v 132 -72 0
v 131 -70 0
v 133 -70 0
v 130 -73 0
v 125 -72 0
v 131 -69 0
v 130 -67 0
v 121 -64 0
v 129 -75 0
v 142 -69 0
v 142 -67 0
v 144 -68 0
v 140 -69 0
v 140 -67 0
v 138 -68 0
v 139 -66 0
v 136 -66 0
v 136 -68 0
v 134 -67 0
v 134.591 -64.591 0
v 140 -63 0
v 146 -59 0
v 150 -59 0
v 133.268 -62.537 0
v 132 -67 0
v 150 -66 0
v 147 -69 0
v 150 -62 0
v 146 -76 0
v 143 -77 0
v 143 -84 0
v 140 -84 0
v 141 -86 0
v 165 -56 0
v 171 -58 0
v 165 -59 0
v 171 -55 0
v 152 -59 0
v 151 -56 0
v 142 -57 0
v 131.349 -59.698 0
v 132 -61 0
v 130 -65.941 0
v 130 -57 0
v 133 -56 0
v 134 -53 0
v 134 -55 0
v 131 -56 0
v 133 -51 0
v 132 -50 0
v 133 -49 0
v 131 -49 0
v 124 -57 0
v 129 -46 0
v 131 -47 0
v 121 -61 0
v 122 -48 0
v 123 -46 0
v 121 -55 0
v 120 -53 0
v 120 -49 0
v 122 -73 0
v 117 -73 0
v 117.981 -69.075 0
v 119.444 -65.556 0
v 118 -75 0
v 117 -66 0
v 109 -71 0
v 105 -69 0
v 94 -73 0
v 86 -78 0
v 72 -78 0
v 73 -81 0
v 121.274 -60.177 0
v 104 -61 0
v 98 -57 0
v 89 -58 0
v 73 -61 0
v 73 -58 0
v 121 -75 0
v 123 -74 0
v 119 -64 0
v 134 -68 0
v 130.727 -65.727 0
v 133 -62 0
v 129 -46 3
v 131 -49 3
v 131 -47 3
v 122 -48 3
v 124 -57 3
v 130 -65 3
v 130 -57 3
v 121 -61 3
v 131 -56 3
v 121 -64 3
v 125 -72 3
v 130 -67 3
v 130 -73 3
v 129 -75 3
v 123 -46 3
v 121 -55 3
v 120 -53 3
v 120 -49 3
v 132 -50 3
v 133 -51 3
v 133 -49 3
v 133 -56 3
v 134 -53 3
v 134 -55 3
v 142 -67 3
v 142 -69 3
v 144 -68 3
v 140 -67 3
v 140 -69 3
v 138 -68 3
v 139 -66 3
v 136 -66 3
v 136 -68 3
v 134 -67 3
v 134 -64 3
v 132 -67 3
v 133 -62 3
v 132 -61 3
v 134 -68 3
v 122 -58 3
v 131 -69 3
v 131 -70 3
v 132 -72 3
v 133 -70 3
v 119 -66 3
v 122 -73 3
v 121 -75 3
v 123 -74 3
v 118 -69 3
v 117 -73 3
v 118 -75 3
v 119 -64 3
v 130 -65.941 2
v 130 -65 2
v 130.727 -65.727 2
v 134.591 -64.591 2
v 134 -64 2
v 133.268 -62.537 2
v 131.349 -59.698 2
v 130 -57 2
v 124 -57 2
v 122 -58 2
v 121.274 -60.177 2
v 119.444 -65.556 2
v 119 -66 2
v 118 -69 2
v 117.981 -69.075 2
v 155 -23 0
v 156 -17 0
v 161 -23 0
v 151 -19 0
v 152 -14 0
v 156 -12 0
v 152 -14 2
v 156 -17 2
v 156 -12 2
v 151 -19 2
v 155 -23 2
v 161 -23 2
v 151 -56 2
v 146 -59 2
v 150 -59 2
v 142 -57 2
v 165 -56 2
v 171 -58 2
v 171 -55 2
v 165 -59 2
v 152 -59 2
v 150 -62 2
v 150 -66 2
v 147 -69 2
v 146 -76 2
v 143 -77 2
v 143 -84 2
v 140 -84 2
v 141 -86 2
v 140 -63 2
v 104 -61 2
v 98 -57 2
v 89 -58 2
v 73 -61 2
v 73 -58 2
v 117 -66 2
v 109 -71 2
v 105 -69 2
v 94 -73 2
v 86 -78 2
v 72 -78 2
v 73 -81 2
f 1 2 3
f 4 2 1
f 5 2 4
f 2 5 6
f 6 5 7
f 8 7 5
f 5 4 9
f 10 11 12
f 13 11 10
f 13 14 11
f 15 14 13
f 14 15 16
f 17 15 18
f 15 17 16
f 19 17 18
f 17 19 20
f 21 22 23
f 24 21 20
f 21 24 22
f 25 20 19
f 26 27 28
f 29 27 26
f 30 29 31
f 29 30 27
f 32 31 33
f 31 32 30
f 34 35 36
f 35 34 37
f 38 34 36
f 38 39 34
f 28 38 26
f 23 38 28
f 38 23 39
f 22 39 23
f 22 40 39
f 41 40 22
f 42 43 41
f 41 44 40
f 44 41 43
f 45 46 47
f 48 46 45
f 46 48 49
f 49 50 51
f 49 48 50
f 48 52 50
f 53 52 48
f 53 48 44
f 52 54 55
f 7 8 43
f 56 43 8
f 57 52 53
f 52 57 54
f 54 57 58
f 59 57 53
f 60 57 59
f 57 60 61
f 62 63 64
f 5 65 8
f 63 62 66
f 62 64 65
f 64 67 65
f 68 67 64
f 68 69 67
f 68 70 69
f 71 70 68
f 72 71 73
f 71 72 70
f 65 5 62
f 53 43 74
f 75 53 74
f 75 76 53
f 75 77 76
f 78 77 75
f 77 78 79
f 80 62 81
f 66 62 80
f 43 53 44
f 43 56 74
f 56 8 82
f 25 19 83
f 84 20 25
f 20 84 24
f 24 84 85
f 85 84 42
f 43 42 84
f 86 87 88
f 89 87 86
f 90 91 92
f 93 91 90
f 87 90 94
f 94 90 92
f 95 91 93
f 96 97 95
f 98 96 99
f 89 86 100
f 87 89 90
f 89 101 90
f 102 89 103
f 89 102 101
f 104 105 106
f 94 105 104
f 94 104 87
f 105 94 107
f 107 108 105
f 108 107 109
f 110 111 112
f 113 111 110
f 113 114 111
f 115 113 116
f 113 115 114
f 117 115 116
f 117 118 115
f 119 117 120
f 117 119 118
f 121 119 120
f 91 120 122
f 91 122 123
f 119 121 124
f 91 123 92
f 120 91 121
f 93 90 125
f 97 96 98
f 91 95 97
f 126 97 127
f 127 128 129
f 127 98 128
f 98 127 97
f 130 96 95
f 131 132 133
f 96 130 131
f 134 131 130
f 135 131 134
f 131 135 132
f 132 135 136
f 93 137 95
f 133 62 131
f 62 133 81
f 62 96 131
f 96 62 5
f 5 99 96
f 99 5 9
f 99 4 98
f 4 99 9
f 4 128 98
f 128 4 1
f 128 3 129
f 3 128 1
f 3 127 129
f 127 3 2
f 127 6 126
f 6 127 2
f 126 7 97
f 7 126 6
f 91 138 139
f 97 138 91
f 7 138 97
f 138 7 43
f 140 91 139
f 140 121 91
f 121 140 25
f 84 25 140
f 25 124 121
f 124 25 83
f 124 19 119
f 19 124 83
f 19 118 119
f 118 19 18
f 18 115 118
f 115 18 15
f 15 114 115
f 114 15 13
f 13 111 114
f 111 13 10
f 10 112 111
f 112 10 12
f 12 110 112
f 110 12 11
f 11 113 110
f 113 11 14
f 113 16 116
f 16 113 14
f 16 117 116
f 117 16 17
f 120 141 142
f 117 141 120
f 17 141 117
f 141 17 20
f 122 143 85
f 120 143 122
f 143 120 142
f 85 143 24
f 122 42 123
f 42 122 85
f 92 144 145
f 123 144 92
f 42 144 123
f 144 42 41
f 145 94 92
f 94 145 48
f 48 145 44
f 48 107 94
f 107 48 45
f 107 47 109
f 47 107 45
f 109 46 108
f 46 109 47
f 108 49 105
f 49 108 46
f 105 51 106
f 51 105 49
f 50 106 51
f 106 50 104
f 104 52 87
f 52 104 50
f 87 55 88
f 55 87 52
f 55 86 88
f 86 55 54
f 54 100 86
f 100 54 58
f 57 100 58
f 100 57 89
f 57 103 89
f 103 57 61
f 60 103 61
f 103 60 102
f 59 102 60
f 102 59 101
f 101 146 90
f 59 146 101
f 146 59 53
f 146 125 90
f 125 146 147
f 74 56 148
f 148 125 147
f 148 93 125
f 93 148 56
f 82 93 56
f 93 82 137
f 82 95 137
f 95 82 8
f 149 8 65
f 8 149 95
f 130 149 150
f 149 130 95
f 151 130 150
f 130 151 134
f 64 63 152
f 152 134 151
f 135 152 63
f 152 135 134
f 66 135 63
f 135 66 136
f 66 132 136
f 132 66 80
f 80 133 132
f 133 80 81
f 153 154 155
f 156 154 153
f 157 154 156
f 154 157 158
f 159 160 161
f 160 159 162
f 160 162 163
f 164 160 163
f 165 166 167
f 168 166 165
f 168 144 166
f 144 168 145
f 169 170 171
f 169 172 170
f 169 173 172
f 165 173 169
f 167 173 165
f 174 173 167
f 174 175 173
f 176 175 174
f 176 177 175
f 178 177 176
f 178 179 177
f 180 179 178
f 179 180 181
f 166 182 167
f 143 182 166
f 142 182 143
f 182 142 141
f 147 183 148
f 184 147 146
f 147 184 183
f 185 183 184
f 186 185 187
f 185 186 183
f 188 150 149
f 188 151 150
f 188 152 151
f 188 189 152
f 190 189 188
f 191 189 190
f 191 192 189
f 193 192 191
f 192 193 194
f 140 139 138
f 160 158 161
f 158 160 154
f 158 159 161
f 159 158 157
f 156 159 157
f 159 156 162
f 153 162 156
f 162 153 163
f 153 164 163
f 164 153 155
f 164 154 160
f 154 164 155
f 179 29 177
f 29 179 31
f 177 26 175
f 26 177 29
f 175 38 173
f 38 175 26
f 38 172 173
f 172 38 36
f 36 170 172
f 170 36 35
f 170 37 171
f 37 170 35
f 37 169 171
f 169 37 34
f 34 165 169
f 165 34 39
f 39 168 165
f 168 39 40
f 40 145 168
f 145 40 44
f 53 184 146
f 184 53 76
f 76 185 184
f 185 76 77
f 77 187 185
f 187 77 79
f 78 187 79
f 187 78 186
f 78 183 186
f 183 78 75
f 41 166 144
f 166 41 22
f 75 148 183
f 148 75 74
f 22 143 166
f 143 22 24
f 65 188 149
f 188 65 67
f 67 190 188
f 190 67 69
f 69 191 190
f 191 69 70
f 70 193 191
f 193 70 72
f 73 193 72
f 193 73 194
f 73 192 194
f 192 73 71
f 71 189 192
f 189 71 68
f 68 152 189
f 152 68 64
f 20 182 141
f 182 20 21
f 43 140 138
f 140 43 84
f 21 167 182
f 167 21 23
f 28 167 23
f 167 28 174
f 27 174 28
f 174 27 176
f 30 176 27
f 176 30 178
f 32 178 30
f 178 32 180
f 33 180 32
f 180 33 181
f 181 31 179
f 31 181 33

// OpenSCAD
//start
module  child() 
{ 
color  ([0.4,1,0.6]) 
{ 
            polygon(points = [
[120.00,-51.00]
,[120.00,-49.00]
,[122.00,-48.00]
,[123.00,-46.00]
,[125.00,-46.00]
,[127.00,-46.00]
,[129.00,-46.00]
,[131.00,-47.00]
,[131.00,-49.00]
,[132.00,-50.00]
,[133.00,-49.00]
,[133.00,-51.00]
,[134.00,-53.00]
,[134.00,-55.00]
,[133.00,-56.00]
,[131.00,-56.00]
,[130.00,-57.00]
,[131.00,-59.00]
,[132.00,-61.00]
,[133.00,-62.00]
,[134.00,-64.00]
,[135.00,-65.00]
,[136.00,-66.00]
,[137.00,-66.00]
,[139.00,-66.00]
,[140.00,-67.00]
,[142.00,-67.00]
,[144.00,-68.00]
,[142.00,-69.00]
,[140.00,-69.00]
,[138.00,-68.00]
,[136.00,-68.00]
,[134.00,-67.00]
,[134.00,-68.00]
,[132.00,-67.00]
,[131.00,-66.00]
,[130.00,-65.00]
,[130.00,-67.00]
,[131.00,-69.00]
,[131.00,-70.00]
,[133.00,-70.00]
,[132.00,-72.00]
,[130.00,-73.00]
,[129.00,-75.00]
,[125.00,-72.00]
,[122.00,-73.00]
,[123.00,-74.00]
,[121.00,-75.00]
,[119.00,-75.00]
,[118.00,-75.00]
,[117.00,-73.00]
,[118.00,-69.00]
,[119.00,-66.00]
,[121.00,-64.00]
,[119.00,-64.00]
,[121.00,-61.00]
,[122.00,-58.00]
,[124.00,-57.00]
,[121.00,-55.00]
,[120.00,-53.00]
,[120.00,-53.00]
]
,paths = [
[0,1,2,3,4,5,6,7,8,9,10,11,12,13,14,15,16,17,18,19,20,21,22,23,24,25,26,27,28,29,30,31,32,33,34,35,36,37,38,39,40,41,42,43,44,45,46,47,48,49,50,51,52,53,54,55,56,57,58,59,60]]
            );
}
}
//start
module  background() 
{ 
color  ([0.8,0,1]) 
{ 
            polygon(points = [
[73.00,-58.00]
,[81.00,-58.00]
,[89.00,-58.00]
,[98.00,-57.00]
,[109.00,-57.00]
,[119.00,-57.00]
,[127.00,-57.00]
,[136.00,-57.00]
,[142.00,-57.00]
,[151.00,-56.00]
,[157.00,-56.00]
,[165.00,-56.00]
,[171.00,-55.00]
,[171.00,-58.00]
,[165.00,-59.00]
,[158.00,-59.00]
,[152.00,-59.00]
,[150.00,-66.00]
,[146.00,-76.00]
,[143.00,-84.00]
,[141.00,-86.00]
,[140.00,-84.00]
,[143.00,-77.00]
,[147.00,-69.00]
,[150.00,-62.00]
,[150.00,-59.00]
,[140.00,-63.00]
,[123.00,-68.00]
,[109.00,-71.00]
,[86.00,-78.00]
,[73.00,-81.00]
,[72.00,-78.00]
,[94.00,-73.00]
,[105.00,-69.00]
,[117.00,-66.00]
,[128.00,-64.00]
,[146.00,-59.00]
,[104.00,-61.00]
,[91.00,-61.00]
,[73.00,-61.00]
,[152.00,-14.00]
,[151.00,-19.00]
,[155.00,-23.00]
,[159.00,-23.00]
,[161.00,-23.00]
,[156.00,-17.00]
,[156.00,-12.00]
]
,paths = [
[0,1,2,3,4,5,6,7,8,9,10,11,12,13,14,15,16,17,18,19,20,21,22,23,24,25,26,27,28,29,30,31,32,33,34,35,36,37,38,39],[40,41,42,43,44,45,46]]
            );
}
}

linear_extrude(height = 3){
translate([0, 0, 7]) child();
}
linear_extrude(height = 2){
background();
}
